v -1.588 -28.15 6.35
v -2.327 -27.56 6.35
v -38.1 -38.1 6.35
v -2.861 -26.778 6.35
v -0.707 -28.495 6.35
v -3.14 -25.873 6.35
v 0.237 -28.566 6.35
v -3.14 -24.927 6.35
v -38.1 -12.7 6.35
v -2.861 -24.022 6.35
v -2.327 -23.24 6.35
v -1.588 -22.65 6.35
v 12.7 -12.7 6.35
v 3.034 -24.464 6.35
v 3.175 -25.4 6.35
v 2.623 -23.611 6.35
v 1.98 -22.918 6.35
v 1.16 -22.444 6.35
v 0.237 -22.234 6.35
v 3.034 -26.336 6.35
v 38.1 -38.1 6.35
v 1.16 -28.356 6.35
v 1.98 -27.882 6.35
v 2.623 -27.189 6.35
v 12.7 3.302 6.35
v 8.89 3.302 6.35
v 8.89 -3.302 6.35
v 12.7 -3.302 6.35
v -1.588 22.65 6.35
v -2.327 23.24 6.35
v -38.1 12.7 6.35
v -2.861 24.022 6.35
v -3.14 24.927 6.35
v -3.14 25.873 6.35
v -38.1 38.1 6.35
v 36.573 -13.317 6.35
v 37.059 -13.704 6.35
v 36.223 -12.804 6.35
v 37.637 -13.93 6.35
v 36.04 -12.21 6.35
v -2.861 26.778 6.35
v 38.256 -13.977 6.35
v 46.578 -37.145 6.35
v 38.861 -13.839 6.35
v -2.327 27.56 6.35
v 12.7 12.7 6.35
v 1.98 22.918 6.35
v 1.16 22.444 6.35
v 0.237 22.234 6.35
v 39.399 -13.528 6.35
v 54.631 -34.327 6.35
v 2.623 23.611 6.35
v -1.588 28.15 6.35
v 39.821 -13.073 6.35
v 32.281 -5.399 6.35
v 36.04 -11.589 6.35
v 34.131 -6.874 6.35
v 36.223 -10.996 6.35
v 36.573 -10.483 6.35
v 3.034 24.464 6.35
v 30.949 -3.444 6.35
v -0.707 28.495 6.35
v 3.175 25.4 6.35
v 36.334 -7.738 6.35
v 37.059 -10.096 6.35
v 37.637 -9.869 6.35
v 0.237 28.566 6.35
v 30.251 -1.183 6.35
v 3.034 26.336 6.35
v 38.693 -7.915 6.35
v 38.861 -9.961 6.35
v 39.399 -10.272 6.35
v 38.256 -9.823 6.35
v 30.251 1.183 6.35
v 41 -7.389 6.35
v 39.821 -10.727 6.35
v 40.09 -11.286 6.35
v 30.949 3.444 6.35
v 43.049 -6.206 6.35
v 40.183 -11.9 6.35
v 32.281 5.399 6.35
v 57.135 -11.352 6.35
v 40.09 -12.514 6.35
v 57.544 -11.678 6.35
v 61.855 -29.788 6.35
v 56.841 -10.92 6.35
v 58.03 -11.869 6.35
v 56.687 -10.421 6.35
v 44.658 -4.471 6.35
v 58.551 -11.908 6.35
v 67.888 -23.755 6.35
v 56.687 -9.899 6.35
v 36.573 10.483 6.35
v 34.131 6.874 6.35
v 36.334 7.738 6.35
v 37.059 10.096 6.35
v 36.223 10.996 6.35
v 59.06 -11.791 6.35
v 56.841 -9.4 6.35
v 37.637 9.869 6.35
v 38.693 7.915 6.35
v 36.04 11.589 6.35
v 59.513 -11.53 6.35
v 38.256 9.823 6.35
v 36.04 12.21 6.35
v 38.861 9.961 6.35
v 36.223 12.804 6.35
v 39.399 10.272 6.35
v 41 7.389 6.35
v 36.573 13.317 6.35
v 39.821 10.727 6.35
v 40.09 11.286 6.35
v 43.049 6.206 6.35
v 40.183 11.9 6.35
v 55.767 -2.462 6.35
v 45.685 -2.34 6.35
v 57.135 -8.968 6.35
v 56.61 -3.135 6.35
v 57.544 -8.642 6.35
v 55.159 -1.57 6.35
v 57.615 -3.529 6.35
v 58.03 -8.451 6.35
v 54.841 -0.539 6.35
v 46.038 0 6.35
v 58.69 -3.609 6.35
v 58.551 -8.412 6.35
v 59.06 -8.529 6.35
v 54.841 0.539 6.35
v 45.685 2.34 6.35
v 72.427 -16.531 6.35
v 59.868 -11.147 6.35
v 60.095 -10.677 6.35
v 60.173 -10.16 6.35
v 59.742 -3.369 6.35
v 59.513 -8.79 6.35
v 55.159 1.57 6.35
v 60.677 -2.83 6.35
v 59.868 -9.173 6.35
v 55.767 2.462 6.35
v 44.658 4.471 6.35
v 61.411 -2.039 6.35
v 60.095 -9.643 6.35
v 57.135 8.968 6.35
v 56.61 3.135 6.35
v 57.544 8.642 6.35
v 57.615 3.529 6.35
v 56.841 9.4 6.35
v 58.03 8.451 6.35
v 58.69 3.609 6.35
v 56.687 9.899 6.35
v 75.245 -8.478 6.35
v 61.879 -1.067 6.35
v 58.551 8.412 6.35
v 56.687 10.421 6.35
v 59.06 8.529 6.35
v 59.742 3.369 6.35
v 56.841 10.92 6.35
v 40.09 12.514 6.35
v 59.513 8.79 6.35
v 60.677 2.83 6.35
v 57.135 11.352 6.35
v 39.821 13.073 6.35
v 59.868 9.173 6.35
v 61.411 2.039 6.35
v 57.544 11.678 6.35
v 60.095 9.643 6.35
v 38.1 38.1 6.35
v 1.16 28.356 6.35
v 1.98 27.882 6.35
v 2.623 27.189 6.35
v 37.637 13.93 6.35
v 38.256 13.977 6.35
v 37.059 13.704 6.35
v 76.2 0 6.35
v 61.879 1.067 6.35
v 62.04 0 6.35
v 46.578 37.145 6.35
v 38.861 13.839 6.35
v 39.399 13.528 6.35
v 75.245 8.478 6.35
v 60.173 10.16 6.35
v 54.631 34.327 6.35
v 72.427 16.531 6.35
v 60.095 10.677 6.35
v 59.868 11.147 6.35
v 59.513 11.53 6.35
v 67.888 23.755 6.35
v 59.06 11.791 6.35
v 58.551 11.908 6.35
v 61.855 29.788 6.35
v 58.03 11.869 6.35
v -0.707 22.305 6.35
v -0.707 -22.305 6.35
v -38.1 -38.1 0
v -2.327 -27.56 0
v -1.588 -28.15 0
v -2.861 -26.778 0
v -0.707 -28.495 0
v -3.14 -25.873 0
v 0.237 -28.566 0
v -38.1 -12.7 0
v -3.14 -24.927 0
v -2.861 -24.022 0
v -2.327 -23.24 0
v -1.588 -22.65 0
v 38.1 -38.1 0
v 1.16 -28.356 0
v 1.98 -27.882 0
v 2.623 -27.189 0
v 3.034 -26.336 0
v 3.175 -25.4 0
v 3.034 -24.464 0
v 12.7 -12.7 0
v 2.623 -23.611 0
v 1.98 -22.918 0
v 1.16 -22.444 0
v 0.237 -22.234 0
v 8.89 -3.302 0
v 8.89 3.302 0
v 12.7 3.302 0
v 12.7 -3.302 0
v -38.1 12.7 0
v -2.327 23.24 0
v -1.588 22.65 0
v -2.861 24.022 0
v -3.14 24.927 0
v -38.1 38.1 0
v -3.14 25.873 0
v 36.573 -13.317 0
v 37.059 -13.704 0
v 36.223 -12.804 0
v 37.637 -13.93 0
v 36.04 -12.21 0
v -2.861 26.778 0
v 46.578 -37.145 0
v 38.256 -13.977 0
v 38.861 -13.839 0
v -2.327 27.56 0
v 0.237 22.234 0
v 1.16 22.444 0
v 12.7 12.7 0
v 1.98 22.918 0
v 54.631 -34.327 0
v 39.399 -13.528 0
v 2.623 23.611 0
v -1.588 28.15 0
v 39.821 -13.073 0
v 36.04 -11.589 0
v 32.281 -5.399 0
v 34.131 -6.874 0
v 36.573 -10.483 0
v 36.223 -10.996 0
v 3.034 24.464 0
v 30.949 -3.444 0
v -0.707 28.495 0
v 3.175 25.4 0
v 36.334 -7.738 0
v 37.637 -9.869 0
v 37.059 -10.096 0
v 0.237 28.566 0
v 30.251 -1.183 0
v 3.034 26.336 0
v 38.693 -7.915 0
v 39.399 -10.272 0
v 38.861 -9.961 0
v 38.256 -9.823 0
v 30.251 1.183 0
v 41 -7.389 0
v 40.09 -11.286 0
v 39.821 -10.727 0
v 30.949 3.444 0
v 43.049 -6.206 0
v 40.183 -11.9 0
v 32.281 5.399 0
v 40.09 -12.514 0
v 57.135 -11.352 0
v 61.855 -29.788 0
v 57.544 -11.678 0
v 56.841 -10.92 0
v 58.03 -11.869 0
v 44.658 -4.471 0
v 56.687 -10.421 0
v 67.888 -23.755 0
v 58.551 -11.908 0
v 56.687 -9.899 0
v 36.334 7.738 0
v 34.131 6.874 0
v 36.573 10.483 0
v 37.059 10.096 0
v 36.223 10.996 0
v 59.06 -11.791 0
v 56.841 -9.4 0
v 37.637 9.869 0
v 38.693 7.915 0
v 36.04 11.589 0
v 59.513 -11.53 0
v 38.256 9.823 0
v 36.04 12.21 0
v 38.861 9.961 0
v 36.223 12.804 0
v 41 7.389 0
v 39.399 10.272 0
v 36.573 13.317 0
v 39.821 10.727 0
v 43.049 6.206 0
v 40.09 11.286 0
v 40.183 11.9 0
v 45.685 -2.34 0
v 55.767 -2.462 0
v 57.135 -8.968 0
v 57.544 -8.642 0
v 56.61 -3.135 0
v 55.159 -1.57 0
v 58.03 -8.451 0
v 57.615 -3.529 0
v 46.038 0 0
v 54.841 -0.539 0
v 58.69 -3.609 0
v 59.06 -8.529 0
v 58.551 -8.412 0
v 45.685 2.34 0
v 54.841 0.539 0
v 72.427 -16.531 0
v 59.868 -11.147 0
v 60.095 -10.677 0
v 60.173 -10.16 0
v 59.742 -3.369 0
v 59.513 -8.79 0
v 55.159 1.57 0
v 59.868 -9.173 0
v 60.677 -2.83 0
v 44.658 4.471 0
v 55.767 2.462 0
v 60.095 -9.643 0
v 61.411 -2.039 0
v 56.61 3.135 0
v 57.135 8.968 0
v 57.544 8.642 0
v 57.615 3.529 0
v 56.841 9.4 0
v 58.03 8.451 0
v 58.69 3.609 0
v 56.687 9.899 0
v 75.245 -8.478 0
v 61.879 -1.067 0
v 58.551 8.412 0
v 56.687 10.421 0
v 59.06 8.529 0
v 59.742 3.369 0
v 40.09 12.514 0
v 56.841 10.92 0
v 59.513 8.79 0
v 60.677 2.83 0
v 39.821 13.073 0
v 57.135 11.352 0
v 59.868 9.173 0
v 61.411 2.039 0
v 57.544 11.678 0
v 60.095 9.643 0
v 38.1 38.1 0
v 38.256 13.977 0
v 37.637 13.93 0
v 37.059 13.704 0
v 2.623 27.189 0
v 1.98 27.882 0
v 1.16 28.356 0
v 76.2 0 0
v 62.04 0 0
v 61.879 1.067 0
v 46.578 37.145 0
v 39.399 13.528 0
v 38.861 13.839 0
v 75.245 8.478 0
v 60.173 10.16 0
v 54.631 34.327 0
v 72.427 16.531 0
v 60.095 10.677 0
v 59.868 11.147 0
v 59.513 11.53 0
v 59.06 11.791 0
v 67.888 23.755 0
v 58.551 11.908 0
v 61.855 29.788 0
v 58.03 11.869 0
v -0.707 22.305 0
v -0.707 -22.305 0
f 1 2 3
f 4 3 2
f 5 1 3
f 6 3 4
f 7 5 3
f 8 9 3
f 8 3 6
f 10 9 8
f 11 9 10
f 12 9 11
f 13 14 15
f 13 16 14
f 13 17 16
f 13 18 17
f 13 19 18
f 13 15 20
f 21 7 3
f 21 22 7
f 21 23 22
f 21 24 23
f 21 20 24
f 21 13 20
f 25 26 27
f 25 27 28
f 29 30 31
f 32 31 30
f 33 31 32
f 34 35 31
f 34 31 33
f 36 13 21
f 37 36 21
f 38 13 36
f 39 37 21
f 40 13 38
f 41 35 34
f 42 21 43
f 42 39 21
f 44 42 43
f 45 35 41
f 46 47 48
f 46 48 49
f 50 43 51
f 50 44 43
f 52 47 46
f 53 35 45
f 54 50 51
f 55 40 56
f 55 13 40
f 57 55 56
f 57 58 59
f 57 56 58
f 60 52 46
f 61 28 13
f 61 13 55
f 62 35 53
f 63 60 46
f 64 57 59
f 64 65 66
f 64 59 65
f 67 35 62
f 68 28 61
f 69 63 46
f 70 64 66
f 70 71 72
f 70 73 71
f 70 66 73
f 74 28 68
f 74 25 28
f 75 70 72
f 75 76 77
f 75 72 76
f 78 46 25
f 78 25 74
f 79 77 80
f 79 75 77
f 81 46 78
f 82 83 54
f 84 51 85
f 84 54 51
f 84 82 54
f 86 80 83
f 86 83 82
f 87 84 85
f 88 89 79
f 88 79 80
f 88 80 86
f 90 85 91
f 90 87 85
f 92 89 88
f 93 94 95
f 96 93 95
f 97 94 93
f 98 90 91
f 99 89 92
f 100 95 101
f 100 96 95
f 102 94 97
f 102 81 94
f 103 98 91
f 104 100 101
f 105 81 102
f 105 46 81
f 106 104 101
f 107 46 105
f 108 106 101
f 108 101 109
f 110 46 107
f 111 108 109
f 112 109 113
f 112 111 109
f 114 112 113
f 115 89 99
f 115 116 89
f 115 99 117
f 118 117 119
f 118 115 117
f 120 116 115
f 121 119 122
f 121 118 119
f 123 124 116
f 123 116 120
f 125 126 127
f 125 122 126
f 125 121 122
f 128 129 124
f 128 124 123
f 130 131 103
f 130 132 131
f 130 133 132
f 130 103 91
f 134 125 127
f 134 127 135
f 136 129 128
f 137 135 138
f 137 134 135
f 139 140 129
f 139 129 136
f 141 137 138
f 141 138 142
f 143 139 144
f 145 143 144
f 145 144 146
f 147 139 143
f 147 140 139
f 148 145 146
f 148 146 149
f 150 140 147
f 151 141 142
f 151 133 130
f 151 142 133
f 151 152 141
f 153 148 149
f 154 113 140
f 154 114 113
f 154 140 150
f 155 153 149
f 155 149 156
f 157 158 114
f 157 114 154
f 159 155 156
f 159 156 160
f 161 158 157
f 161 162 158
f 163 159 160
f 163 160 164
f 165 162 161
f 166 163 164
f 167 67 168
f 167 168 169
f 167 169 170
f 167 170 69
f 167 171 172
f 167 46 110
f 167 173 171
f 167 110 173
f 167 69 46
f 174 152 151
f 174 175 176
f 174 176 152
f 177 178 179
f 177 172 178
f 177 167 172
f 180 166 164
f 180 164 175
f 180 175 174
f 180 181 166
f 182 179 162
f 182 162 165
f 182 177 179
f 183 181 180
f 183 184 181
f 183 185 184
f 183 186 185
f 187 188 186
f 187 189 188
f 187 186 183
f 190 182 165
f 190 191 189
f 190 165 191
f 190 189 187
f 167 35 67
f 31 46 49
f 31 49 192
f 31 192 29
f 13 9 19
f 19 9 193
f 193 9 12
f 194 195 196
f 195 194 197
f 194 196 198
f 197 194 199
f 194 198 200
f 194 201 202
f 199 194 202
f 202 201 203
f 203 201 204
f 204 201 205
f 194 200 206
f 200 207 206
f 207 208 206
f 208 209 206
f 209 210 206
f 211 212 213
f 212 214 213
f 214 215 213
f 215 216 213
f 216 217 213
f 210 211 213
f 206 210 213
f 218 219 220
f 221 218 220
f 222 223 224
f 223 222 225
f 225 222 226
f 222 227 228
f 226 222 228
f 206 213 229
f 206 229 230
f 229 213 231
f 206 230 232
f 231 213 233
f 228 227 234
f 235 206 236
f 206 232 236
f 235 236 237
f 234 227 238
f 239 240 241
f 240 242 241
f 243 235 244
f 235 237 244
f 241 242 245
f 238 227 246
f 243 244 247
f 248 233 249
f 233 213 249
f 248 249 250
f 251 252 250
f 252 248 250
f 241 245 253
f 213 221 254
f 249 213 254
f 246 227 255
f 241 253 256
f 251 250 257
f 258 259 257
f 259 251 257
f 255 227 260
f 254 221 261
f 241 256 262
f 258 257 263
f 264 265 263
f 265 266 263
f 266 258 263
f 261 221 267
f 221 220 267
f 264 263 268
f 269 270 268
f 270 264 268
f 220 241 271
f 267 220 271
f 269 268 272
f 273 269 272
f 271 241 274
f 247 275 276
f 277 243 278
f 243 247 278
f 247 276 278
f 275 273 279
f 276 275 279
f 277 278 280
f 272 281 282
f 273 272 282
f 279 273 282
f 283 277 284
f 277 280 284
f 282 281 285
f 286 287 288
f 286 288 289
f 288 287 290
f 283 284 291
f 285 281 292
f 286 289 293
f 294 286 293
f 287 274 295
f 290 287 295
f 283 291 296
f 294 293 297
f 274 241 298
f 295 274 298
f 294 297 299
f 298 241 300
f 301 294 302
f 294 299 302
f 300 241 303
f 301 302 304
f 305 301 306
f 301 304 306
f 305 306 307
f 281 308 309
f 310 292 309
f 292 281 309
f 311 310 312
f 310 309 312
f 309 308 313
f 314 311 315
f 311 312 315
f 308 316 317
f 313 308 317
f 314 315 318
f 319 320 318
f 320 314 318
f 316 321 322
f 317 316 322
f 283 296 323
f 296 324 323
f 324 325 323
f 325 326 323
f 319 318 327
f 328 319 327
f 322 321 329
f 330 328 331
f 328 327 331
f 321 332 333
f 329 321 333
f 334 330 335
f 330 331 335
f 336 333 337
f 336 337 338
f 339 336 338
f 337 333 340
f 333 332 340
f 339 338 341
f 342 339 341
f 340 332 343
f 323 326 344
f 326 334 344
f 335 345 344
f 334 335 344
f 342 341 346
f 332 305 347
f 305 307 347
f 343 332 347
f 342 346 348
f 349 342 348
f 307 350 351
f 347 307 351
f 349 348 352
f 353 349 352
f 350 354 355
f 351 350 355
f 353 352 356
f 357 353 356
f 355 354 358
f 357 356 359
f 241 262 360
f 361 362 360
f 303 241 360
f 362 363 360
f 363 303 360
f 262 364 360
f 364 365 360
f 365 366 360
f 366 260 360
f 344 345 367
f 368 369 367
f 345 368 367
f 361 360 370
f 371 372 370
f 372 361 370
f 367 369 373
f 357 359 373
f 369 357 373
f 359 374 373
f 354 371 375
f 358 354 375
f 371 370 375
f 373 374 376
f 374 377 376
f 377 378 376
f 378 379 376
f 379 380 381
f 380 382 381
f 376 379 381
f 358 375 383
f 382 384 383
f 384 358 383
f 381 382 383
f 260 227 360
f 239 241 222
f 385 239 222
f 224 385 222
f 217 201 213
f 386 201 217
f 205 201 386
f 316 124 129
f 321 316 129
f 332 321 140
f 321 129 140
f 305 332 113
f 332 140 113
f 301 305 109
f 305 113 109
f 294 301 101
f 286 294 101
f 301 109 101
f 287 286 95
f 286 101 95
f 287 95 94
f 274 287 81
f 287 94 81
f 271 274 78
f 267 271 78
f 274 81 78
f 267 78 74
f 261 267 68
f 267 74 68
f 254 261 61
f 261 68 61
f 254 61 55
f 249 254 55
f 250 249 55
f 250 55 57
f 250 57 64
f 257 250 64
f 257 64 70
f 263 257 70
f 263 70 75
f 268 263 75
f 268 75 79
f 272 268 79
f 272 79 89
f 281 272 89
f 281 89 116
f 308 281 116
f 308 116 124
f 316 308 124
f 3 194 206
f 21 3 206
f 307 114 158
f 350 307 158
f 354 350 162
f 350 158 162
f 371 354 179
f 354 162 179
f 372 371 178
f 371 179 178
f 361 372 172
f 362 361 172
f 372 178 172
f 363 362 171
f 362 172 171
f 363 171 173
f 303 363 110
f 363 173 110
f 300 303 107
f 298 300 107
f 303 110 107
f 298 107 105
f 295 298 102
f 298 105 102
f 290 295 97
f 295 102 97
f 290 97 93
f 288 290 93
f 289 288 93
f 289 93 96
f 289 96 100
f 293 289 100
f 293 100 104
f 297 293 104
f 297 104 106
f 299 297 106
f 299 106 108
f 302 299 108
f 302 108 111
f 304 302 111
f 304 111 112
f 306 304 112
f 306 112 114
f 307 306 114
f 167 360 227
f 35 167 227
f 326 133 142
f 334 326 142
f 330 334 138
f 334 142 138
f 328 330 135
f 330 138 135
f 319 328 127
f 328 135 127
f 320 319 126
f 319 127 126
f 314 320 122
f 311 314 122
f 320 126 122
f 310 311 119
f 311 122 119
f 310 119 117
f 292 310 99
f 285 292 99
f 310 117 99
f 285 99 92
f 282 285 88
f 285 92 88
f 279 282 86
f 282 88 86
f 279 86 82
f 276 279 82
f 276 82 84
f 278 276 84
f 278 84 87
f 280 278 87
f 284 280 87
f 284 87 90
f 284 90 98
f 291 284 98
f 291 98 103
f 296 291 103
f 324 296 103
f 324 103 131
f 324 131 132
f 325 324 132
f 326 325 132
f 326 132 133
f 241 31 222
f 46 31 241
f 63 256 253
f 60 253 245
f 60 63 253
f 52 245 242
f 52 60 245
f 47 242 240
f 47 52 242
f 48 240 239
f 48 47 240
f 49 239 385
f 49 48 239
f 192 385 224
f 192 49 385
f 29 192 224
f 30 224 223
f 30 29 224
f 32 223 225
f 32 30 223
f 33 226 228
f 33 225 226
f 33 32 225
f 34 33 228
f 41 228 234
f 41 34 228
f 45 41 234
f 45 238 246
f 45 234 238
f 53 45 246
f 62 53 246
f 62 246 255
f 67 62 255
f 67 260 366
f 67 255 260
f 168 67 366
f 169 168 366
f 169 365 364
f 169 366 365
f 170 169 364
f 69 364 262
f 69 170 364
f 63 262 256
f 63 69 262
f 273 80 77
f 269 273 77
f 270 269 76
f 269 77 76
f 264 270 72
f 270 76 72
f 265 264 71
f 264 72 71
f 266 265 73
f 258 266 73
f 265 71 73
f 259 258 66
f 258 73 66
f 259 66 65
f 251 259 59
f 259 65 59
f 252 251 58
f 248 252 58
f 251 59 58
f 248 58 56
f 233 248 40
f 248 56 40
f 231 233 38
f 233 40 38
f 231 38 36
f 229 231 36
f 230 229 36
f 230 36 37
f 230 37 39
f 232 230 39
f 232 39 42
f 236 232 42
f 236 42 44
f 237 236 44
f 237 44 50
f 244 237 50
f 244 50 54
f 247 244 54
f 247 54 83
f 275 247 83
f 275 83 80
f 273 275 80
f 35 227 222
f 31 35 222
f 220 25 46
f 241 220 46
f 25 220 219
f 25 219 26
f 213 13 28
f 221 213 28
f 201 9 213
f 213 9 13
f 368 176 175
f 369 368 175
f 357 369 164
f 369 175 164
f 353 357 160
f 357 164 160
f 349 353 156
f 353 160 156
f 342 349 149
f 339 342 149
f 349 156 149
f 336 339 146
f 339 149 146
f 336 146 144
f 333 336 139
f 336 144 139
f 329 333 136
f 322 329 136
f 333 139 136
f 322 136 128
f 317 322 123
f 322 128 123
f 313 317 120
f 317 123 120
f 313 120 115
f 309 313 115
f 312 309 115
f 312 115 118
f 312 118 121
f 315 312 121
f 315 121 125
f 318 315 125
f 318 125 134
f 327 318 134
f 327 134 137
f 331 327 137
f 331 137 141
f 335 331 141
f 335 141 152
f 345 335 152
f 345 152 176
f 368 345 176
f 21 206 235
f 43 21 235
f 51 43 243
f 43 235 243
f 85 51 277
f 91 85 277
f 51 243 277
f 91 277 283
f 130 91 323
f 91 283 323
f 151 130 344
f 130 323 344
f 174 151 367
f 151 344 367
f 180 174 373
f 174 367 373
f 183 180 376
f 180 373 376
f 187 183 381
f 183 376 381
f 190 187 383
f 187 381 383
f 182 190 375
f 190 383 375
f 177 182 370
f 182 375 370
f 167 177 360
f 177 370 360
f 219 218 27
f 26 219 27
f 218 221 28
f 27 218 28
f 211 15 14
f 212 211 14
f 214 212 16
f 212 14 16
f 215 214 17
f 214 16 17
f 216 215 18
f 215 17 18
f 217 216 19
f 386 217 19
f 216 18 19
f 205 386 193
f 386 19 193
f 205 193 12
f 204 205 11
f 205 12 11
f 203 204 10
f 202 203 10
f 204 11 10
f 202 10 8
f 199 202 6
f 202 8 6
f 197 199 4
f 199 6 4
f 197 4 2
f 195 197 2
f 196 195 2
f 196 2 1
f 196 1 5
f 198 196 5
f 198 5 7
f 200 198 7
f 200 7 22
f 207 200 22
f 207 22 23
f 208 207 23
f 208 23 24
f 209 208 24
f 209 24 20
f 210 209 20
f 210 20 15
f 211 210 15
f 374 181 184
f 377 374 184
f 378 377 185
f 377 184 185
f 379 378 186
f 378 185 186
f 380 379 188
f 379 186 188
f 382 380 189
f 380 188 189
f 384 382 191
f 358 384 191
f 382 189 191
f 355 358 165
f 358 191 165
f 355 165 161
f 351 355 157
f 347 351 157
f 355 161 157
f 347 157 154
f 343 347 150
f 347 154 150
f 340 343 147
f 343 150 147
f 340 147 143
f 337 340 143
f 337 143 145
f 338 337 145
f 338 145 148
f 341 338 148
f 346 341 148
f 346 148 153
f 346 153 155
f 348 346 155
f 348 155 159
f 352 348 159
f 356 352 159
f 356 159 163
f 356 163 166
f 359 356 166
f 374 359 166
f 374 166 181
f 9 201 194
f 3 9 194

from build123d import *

# Parameters (mm, degrees)
BOSS_EXTRUDE1_DEPTH   = 6.35
SKETCH2_W             = 50.8
SKETCH2_H             = 25.4
CUT_EXTRUDE1_DEPTH    = 86.430512699
SKETCH5_R             = 7.9375
SKETCH5_R_2           = 2.0828
CUT_EXTRUDE4_DEPTH    = 86.430512699
SKETCH4_R             = 3.175
CUT_EXTRUDE5_DEPTH    = 86.430512699
SKETCH6_W             = 6.35
SKETCH6_H             = 6.604
BOSS_EXTRUDE2_DEPTH   = 3.81
CUT_EXTRUDE7_REACH    = 87.431
SKETCH8_R             = 3.6195
F_6_CLEARANCE_HOLE1_D = 3.5052


with BuildPart() as part:
    # Sketch1 → Boss-Extrude1 (new body)
    with BuildSketch(Plane.XY):
        with BuildLine():
            Line((-38.1, -38.1), (38.1, -38.1))
            ThreePointArc((38.1, -38.1), (76.2, 0), (38.1, 38.1))
            Line((38.1, 38.1), (-38.1, 38.1))
            Line((-38.1, 38.1), (-38.1, -38.1))
        make_face()
    extrude(amount=BOSS_EXTRUDE1_DEPTH)

    # Sketch2 → Cut-Extrude1 (cut, through all)
    with BuildSketch(Plane.XY.offset(6.35)):
        with Locations((-12.7, 0)):
            Rectangle(SKETCH2_W, SKETCH2_H)
    extrude(amount=-CUT_EXTRUDE1_DEPTH, mode=Mode.SUBTRACT)

    # Sketch5 → Cut-Extrude4 (cut, through all)
    with BuildSketch(Plane.XY.offset(6.35)):
        with Locations((38.1, 0)):
            Circle(SKETCH5_R)
        with Locations((38.1, 11.8999)):
            Circle(SKETCH5_R_2)
        with Locations((38.1, -11.8999)):
            Circle(SKETCH5_R_2)
    extrude(amount=-CUT_EXTRUDE4_DEPTH, mode=Mode.SUBTRACT)

    # Sketch4 → Cut-Extrude5 (cut, through all)
    with BuildSketch(Plane.XY.offset(6.35)):
        with Locations((0, -25.4)):
            Circle(SKETCH4_R)
    cut_extrude5 = extrude(amount=-CUT_EXTRUDE5_DEPTH, mode=Mode.SUBTRACT)

    # Mirror3: Cut-Extrude5 across plane
    add(cut_extrude5.mirror(Plane.ZX), mode=Mode.SUBTRACT)

    # Sketch6 → Boss-Extrude2 (add)
    with BuildSketch(Plane.ZY.offset(-12.7)):
        with Locations((3.175, 0)):
            Rectangle(SKETCH6_W, SKETCH6_H)
    extrude(amount=BOSS_EXTRUDE2_DEPTH)

    # Sketch8 → Cut-Extrude7 (cut, up to next)
    with BuildSketch(Plane.XY.offset(6.35), mode=Mode.PRIVATE) as cut_extrude7_sk1:
        with Locations((58.42, 0)):
            Circle(SKETCH8_R)
    cut_extrude7_tool1 = extrude(cut_extrude7_sk1.sketch, amount=-CUT_EXTRUDE7_REACH, mode=Mode.PRIVATE) & part.part
    add(cut_extrude7_tool1.solids().sort_by_distance((58.42, 0, 6.35))[0], mode=Mode.SUBTRACT)

    # #6 Clearance Hole1 (through all)
    with Locations(Plane(origin=(0, 0, 0), x_dir=(-1, 0, 0), z_dir=(0, 0, -1))):
        with Locations((-58.42, 10.16), (-58.42, -10.16)):
            Hole(F_6_CLEARANCE_HOLE1_D / 2)


solid = part.part
